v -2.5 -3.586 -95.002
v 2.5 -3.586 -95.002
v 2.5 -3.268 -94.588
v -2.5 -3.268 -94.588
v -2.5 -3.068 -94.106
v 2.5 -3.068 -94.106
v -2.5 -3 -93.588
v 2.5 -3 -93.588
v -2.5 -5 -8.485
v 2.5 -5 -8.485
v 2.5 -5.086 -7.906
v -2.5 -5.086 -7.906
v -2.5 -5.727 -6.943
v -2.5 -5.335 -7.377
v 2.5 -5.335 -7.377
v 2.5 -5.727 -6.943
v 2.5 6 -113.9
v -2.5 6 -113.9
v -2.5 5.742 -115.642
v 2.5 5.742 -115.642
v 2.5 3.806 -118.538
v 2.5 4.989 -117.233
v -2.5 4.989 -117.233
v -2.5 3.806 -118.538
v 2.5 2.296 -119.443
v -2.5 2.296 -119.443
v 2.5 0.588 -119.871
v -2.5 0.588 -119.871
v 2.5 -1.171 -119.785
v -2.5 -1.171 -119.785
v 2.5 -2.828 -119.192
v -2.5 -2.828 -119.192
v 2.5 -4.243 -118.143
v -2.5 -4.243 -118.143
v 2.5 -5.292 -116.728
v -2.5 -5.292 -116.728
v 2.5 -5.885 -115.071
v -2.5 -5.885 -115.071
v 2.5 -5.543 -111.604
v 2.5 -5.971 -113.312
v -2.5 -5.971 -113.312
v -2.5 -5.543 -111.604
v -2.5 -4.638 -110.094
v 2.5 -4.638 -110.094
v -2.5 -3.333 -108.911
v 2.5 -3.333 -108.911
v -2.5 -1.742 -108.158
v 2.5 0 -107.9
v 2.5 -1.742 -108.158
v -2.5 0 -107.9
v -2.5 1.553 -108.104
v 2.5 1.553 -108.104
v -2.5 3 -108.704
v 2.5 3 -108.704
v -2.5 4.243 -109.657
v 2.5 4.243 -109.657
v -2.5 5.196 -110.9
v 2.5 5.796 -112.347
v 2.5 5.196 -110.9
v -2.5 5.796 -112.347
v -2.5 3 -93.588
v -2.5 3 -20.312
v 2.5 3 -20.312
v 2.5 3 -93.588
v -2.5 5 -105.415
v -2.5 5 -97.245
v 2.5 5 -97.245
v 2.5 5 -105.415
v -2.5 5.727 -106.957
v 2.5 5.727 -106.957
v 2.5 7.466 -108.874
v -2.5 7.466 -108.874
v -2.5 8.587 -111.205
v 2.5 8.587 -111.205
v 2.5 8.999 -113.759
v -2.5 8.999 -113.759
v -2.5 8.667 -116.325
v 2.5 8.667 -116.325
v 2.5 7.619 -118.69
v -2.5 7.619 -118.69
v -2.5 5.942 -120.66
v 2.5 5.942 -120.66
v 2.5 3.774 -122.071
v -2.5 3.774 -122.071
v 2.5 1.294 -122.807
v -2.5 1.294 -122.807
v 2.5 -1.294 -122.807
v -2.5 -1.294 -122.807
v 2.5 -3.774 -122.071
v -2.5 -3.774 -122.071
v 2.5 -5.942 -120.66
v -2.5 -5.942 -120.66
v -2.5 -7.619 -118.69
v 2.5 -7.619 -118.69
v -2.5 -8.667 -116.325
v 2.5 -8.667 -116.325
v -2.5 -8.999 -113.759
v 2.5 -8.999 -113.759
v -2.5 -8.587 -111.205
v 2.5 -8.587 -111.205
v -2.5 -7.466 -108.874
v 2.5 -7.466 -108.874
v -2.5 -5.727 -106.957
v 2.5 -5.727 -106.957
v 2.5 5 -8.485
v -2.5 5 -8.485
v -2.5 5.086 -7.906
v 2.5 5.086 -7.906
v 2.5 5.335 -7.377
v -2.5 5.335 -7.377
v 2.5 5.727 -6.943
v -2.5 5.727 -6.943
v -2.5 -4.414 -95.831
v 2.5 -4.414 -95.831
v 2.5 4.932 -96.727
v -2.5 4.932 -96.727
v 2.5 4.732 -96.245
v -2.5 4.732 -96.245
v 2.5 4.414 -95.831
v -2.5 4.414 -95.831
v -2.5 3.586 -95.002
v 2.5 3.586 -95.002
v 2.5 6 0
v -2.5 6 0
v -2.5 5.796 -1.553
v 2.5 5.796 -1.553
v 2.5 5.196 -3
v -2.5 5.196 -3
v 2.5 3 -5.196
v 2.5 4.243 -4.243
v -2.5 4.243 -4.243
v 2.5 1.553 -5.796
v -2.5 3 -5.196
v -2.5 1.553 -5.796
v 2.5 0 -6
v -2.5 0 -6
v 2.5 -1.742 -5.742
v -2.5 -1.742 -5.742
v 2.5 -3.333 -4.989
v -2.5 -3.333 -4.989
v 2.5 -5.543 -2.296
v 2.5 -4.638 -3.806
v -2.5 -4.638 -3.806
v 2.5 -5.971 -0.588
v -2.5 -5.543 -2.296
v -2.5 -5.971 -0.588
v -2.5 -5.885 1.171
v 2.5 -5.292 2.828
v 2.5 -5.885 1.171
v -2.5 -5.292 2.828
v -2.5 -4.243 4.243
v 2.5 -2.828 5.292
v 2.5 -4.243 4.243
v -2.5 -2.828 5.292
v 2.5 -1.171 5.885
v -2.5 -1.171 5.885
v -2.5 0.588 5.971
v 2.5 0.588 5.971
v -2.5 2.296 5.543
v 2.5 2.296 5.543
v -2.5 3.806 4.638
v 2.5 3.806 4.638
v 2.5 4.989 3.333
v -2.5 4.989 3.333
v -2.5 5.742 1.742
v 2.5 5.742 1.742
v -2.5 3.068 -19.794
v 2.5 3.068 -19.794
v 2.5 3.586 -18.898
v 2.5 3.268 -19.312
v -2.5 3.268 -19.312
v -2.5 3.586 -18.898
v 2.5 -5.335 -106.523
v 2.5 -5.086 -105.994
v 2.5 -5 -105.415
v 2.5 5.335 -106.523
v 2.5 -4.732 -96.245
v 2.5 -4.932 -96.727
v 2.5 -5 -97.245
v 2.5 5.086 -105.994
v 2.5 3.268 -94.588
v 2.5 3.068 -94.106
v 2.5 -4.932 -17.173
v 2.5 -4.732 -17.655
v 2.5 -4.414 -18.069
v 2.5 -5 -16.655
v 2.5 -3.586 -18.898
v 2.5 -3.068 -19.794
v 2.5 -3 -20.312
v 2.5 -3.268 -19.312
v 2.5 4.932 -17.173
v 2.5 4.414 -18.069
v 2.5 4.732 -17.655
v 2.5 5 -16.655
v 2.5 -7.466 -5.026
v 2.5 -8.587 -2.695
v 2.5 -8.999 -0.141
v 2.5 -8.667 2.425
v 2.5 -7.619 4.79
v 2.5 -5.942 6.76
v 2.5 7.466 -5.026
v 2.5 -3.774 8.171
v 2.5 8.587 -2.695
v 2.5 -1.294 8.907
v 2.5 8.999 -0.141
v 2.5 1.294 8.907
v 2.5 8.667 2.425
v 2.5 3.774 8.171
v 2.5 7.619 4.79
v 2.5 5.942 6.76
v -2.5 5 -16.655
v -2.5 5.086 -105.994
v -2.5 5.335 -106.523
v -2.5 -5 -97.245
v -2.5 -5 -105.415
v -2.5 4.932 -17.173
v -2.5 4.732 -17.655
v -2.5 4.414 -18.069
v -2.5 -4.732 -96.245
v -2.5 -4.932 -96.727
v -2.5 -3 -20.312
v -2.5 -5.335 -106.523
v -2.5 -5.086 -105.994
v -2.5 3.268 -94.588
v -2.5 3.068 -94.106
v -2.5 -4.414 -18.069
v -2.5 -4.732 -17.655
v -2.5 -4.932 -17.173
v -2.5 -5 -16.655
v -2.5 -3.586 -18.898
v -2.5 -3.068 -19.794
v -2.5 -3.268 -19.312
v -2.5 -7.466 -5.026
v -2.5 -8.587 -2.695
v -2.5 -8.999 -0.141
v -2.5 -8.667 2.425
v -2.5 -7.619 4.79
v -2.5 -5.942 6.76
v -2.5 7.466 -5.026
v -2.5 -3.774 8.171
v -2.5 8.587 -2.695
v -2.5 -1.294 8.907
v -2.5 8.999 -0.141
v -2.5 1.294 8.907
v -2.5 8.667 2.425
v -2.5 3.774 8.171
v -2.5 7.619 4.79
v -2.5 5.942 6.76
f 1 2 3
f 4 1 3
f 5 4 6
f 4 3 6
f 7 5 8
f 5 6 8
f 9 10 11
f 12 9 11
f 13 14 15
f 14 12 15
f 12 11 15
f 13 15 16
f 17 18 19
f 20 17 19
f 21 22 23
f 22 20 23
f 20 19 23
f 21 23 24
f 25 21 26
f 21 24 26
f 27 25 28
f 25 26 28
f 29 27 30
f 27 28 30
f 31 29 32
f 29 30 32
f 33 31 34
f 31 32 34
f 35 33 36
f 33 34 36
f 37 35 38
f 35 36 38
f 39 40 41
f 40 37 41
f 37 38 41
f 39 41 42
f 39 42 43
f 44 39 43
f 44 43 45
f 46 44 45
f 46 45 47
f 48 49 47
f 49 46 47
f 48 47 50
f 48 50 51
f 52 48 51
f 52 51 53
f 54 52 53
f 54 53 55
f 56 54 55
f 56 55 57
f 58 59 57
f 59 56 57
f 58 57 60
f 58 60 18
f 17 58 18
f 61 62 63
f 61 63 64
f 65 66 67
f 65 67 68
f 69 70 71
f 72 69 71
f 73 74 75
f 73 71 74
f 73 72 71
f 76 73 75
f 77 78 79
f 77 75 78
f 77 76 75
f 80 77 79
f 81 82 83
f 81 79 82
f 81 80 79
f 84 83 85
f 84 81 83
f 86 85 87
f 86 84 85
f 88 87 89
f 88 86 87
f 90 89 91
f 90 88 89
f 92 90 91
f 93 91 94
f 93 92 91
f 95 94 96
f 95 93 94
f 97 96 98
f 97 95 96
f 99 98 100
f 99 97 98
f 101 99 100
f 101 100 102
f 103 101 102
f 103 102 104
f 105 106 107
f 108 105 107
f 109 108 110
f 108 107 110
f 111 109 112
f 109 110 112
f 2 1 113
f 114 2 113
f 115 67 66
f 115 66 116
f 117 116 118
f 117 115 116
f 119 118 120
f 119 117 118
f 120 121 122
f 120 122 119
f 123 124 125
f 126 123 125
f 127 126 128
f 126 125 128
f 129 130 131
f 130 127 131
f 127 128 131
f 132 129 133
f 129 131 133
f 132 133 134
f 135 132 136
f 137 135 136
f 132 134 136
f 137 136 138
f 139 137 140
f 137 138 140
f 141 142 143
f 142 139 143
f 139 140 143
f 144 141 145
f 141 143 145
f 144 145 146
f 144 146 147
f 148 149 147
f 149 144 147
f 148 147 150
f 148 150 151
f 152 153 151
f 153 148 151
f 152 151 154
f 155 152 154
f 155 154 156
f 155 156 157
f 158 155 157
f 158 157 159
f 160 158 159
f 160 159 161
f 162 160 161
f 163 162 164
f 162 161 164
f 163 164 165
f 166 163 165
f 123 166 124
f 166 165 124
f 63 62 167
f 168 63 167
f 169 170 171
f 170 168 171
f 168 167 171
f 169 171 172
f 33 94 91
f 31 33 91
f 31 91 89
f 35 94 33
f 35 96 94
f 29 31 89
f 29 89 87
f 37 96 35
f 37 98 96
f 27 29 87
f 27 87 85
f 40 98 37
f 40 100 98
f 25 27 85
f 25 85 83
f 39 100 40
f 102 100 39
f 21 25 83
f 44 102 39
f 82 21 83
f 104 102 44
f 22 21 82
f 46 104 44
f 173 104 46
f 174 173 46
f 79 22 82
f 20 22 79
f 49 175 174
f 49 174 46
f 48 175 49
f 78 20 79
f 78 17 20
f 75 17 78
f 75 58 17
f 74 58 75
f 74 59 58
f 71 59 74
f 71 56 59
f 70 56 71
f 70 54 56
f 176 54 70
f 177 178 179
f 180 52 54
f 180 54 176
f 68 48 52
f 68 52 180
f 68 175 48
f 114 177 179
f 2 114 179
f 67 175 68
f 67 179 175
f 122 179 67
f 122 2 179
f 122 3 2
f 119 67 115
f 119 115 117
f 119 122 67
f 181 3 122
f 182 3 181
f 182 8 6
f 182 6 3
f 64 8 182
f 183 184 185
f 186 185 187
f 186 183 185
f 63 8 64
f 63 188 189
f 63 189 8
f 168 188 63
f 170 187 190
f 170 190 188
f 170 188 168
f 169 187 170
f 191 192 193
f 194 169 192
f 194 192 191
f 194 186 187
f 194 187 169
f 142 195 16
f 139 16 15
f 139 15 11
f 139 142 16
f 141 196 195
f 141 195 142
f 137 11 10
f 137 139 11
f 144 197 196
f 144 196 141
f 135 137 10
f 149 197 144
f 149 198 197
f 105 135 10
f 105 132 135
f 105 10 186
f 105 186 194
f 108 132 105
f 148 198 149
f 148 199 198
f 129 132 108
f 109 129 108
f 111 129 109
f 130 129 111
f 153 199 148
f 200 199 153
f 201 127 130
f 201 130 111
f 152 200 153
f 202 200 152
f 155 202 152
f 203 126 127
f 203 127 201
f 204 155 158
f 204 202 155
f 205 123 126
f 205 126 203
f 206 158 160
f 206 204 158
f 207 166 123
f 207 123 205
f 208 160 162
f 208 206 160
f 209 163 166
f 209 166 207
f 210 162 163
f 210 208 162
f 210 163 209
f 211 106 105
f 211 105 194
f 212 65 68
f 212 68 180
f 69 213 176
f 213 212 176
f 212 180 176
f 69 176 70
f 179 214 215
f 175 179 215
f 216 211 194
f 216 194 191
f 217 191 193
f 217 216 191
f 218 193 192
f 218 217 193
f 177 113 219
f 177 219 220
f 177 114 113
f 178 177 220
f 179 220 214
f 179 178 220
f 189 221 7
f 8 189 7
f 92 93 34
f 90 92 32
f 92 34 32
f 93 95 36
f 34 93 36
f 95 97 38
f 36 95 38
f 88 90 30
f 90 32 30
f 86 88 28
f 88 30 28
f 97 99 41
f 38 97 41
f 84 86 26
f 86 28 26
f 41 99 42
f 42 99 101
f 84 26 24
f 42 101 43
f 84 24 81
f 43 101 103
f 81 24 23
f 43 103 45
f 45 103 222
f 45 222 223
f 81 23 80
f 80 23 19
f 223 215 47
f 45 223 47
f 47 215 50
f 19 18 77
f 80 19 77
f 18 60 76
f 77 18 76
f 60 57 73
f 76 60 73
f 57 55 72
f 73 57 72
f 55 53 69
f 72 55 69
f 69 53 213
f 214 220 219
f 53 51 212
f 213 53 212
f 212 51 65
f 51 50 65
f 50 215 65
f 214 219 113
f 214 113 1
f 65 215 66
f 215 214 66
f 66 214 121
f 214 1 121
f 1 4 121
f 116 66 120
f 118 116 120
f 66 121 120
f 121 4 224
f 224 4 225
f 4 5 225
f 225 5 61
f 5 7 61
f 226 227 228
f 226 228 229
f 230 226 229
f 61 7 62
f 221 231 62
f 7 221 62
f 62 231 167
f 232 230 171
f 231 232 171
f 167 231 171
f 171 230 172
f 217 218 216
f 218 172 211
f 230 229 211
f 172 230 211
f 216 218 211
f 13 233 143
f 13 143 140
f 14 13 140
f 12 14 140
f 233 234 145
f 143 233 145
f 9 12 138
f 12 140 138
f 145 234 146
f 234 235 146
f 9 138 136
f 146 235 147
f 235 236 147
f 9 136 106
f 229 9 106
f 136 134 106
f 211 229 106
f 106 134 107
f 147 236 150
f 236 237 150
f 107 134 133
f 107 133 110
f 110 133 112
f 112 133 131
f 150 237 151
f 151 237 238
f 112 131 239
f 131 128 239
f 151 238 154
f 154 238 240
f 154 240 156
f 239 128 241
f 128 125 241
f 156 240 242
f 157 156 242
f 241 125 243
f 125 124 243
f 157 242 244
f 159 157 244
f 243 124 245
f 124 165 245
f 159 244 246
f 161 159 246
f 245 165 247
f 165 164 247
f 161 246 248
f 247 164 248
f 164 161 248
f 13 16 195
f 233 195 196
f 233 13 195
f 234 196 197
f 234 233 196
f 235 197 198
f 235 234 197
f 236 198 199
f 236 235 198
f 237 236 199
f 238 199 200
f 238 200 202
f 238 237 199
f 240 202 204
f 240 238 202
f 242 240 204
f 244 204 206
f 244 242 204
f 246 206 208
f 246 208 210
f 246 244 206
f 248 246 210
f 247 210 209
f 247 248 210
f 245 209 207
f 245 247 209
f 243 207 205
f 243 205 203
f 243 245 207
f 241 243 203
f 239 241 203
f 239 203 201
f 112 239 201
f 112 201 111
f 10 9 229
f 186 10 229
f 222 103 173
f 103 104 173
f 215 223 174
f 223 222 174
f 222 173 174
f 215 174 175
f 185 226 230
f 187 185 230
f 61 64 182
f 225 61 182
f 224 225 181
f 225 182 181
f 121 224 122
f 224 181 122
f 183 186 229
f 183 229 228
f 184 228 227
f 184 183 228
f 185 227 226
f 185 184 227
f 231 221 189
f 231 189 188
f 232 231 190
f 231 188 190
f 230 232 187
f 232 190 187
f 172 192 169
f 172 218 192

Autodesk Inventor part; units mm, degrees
ref_plane "YZ Plane" through (0, 0, 0) normal (1, 0, 0) x (0, 1, 0)
ref_plane "XZ Plane" through (0, 0, 0) normal (0, 1, 0) x (-1, 0, 0)
ref_plane "XY Plane" through (0, 0, 0) normal (0, 0, 1) x (1, 0, 0)
sketch "草圖1" plane through (0, 0, 0) normal (1, 0, 0) x (0, 1, 0)
  line L0 (0, 0) -> (0, -113.9)
  circle A0 centre (0, 0) radius 6
  circle A1 centre (0, -113.9) radius 6
  circle A2 centre (0, 0) radius 9
  circle A3 centre (0, -113.9) radius 9
  line L1 (5, -7.4833) -> (5, -17.4833)
  line L2 (5, -17.4833) -> (3, -19.4833)
  line L3 (3, -19.4833) -> (3, -94.4167)
  line L4 (3, -94.4167) -> (5, -96.4167)
  line L5 (5, -96.4167) -> (5, -106.4167)
  line L6 (-5, -7.4833) -> (-5, -17.4833)
  line L7 (-5, -17.4833) -> (-3, -19.4833)
  line L8 (-3, -19.4833) -> (-3, -94.4167)
  line L9 (-3, -94.4167) -> (-5, -96.4167)
  line L10 (-5, -96.4167) -> (-5, -106.4167)
  dimension "d0" = 113.9
  dimension "d1" = 12
  dimension "d2" = 12
  dimension "d3" = 18
  dimension "d4" = 18
  dimension "d5" = 3
  dimension "d6" = 3
  dimension "d7" = 135
  dimension "d8" = 5
  dimension "d9" = 10
  dimension "d10" = 10
  dimension "d11" = 135
extrude "擠出1" add sketch "草圖1" along normal mid plane 5
fillet "圓角1" radius 2 12 edges at (0, 5, -7.4833) (0, 5, -17.4833) (0, 3, -19.4833) (0, 3, -94.4167) (0, 5, -96.4167) (0, 5, -106.4167) (0, -5, -7.4833) (0, -5, -17.4833) (0, -3, -19.4833) (0, -3, -94.4167) (0, -5, -96.4167) (0, -5, -106.4167)
equation "\"d2\" = d1"
equation "\"d4\" = d3"
equation "\"d6\" = d5"
equation "\"d10\" = d9"
equation "\"d11\" = d7"
properties part number "Link_FG"
